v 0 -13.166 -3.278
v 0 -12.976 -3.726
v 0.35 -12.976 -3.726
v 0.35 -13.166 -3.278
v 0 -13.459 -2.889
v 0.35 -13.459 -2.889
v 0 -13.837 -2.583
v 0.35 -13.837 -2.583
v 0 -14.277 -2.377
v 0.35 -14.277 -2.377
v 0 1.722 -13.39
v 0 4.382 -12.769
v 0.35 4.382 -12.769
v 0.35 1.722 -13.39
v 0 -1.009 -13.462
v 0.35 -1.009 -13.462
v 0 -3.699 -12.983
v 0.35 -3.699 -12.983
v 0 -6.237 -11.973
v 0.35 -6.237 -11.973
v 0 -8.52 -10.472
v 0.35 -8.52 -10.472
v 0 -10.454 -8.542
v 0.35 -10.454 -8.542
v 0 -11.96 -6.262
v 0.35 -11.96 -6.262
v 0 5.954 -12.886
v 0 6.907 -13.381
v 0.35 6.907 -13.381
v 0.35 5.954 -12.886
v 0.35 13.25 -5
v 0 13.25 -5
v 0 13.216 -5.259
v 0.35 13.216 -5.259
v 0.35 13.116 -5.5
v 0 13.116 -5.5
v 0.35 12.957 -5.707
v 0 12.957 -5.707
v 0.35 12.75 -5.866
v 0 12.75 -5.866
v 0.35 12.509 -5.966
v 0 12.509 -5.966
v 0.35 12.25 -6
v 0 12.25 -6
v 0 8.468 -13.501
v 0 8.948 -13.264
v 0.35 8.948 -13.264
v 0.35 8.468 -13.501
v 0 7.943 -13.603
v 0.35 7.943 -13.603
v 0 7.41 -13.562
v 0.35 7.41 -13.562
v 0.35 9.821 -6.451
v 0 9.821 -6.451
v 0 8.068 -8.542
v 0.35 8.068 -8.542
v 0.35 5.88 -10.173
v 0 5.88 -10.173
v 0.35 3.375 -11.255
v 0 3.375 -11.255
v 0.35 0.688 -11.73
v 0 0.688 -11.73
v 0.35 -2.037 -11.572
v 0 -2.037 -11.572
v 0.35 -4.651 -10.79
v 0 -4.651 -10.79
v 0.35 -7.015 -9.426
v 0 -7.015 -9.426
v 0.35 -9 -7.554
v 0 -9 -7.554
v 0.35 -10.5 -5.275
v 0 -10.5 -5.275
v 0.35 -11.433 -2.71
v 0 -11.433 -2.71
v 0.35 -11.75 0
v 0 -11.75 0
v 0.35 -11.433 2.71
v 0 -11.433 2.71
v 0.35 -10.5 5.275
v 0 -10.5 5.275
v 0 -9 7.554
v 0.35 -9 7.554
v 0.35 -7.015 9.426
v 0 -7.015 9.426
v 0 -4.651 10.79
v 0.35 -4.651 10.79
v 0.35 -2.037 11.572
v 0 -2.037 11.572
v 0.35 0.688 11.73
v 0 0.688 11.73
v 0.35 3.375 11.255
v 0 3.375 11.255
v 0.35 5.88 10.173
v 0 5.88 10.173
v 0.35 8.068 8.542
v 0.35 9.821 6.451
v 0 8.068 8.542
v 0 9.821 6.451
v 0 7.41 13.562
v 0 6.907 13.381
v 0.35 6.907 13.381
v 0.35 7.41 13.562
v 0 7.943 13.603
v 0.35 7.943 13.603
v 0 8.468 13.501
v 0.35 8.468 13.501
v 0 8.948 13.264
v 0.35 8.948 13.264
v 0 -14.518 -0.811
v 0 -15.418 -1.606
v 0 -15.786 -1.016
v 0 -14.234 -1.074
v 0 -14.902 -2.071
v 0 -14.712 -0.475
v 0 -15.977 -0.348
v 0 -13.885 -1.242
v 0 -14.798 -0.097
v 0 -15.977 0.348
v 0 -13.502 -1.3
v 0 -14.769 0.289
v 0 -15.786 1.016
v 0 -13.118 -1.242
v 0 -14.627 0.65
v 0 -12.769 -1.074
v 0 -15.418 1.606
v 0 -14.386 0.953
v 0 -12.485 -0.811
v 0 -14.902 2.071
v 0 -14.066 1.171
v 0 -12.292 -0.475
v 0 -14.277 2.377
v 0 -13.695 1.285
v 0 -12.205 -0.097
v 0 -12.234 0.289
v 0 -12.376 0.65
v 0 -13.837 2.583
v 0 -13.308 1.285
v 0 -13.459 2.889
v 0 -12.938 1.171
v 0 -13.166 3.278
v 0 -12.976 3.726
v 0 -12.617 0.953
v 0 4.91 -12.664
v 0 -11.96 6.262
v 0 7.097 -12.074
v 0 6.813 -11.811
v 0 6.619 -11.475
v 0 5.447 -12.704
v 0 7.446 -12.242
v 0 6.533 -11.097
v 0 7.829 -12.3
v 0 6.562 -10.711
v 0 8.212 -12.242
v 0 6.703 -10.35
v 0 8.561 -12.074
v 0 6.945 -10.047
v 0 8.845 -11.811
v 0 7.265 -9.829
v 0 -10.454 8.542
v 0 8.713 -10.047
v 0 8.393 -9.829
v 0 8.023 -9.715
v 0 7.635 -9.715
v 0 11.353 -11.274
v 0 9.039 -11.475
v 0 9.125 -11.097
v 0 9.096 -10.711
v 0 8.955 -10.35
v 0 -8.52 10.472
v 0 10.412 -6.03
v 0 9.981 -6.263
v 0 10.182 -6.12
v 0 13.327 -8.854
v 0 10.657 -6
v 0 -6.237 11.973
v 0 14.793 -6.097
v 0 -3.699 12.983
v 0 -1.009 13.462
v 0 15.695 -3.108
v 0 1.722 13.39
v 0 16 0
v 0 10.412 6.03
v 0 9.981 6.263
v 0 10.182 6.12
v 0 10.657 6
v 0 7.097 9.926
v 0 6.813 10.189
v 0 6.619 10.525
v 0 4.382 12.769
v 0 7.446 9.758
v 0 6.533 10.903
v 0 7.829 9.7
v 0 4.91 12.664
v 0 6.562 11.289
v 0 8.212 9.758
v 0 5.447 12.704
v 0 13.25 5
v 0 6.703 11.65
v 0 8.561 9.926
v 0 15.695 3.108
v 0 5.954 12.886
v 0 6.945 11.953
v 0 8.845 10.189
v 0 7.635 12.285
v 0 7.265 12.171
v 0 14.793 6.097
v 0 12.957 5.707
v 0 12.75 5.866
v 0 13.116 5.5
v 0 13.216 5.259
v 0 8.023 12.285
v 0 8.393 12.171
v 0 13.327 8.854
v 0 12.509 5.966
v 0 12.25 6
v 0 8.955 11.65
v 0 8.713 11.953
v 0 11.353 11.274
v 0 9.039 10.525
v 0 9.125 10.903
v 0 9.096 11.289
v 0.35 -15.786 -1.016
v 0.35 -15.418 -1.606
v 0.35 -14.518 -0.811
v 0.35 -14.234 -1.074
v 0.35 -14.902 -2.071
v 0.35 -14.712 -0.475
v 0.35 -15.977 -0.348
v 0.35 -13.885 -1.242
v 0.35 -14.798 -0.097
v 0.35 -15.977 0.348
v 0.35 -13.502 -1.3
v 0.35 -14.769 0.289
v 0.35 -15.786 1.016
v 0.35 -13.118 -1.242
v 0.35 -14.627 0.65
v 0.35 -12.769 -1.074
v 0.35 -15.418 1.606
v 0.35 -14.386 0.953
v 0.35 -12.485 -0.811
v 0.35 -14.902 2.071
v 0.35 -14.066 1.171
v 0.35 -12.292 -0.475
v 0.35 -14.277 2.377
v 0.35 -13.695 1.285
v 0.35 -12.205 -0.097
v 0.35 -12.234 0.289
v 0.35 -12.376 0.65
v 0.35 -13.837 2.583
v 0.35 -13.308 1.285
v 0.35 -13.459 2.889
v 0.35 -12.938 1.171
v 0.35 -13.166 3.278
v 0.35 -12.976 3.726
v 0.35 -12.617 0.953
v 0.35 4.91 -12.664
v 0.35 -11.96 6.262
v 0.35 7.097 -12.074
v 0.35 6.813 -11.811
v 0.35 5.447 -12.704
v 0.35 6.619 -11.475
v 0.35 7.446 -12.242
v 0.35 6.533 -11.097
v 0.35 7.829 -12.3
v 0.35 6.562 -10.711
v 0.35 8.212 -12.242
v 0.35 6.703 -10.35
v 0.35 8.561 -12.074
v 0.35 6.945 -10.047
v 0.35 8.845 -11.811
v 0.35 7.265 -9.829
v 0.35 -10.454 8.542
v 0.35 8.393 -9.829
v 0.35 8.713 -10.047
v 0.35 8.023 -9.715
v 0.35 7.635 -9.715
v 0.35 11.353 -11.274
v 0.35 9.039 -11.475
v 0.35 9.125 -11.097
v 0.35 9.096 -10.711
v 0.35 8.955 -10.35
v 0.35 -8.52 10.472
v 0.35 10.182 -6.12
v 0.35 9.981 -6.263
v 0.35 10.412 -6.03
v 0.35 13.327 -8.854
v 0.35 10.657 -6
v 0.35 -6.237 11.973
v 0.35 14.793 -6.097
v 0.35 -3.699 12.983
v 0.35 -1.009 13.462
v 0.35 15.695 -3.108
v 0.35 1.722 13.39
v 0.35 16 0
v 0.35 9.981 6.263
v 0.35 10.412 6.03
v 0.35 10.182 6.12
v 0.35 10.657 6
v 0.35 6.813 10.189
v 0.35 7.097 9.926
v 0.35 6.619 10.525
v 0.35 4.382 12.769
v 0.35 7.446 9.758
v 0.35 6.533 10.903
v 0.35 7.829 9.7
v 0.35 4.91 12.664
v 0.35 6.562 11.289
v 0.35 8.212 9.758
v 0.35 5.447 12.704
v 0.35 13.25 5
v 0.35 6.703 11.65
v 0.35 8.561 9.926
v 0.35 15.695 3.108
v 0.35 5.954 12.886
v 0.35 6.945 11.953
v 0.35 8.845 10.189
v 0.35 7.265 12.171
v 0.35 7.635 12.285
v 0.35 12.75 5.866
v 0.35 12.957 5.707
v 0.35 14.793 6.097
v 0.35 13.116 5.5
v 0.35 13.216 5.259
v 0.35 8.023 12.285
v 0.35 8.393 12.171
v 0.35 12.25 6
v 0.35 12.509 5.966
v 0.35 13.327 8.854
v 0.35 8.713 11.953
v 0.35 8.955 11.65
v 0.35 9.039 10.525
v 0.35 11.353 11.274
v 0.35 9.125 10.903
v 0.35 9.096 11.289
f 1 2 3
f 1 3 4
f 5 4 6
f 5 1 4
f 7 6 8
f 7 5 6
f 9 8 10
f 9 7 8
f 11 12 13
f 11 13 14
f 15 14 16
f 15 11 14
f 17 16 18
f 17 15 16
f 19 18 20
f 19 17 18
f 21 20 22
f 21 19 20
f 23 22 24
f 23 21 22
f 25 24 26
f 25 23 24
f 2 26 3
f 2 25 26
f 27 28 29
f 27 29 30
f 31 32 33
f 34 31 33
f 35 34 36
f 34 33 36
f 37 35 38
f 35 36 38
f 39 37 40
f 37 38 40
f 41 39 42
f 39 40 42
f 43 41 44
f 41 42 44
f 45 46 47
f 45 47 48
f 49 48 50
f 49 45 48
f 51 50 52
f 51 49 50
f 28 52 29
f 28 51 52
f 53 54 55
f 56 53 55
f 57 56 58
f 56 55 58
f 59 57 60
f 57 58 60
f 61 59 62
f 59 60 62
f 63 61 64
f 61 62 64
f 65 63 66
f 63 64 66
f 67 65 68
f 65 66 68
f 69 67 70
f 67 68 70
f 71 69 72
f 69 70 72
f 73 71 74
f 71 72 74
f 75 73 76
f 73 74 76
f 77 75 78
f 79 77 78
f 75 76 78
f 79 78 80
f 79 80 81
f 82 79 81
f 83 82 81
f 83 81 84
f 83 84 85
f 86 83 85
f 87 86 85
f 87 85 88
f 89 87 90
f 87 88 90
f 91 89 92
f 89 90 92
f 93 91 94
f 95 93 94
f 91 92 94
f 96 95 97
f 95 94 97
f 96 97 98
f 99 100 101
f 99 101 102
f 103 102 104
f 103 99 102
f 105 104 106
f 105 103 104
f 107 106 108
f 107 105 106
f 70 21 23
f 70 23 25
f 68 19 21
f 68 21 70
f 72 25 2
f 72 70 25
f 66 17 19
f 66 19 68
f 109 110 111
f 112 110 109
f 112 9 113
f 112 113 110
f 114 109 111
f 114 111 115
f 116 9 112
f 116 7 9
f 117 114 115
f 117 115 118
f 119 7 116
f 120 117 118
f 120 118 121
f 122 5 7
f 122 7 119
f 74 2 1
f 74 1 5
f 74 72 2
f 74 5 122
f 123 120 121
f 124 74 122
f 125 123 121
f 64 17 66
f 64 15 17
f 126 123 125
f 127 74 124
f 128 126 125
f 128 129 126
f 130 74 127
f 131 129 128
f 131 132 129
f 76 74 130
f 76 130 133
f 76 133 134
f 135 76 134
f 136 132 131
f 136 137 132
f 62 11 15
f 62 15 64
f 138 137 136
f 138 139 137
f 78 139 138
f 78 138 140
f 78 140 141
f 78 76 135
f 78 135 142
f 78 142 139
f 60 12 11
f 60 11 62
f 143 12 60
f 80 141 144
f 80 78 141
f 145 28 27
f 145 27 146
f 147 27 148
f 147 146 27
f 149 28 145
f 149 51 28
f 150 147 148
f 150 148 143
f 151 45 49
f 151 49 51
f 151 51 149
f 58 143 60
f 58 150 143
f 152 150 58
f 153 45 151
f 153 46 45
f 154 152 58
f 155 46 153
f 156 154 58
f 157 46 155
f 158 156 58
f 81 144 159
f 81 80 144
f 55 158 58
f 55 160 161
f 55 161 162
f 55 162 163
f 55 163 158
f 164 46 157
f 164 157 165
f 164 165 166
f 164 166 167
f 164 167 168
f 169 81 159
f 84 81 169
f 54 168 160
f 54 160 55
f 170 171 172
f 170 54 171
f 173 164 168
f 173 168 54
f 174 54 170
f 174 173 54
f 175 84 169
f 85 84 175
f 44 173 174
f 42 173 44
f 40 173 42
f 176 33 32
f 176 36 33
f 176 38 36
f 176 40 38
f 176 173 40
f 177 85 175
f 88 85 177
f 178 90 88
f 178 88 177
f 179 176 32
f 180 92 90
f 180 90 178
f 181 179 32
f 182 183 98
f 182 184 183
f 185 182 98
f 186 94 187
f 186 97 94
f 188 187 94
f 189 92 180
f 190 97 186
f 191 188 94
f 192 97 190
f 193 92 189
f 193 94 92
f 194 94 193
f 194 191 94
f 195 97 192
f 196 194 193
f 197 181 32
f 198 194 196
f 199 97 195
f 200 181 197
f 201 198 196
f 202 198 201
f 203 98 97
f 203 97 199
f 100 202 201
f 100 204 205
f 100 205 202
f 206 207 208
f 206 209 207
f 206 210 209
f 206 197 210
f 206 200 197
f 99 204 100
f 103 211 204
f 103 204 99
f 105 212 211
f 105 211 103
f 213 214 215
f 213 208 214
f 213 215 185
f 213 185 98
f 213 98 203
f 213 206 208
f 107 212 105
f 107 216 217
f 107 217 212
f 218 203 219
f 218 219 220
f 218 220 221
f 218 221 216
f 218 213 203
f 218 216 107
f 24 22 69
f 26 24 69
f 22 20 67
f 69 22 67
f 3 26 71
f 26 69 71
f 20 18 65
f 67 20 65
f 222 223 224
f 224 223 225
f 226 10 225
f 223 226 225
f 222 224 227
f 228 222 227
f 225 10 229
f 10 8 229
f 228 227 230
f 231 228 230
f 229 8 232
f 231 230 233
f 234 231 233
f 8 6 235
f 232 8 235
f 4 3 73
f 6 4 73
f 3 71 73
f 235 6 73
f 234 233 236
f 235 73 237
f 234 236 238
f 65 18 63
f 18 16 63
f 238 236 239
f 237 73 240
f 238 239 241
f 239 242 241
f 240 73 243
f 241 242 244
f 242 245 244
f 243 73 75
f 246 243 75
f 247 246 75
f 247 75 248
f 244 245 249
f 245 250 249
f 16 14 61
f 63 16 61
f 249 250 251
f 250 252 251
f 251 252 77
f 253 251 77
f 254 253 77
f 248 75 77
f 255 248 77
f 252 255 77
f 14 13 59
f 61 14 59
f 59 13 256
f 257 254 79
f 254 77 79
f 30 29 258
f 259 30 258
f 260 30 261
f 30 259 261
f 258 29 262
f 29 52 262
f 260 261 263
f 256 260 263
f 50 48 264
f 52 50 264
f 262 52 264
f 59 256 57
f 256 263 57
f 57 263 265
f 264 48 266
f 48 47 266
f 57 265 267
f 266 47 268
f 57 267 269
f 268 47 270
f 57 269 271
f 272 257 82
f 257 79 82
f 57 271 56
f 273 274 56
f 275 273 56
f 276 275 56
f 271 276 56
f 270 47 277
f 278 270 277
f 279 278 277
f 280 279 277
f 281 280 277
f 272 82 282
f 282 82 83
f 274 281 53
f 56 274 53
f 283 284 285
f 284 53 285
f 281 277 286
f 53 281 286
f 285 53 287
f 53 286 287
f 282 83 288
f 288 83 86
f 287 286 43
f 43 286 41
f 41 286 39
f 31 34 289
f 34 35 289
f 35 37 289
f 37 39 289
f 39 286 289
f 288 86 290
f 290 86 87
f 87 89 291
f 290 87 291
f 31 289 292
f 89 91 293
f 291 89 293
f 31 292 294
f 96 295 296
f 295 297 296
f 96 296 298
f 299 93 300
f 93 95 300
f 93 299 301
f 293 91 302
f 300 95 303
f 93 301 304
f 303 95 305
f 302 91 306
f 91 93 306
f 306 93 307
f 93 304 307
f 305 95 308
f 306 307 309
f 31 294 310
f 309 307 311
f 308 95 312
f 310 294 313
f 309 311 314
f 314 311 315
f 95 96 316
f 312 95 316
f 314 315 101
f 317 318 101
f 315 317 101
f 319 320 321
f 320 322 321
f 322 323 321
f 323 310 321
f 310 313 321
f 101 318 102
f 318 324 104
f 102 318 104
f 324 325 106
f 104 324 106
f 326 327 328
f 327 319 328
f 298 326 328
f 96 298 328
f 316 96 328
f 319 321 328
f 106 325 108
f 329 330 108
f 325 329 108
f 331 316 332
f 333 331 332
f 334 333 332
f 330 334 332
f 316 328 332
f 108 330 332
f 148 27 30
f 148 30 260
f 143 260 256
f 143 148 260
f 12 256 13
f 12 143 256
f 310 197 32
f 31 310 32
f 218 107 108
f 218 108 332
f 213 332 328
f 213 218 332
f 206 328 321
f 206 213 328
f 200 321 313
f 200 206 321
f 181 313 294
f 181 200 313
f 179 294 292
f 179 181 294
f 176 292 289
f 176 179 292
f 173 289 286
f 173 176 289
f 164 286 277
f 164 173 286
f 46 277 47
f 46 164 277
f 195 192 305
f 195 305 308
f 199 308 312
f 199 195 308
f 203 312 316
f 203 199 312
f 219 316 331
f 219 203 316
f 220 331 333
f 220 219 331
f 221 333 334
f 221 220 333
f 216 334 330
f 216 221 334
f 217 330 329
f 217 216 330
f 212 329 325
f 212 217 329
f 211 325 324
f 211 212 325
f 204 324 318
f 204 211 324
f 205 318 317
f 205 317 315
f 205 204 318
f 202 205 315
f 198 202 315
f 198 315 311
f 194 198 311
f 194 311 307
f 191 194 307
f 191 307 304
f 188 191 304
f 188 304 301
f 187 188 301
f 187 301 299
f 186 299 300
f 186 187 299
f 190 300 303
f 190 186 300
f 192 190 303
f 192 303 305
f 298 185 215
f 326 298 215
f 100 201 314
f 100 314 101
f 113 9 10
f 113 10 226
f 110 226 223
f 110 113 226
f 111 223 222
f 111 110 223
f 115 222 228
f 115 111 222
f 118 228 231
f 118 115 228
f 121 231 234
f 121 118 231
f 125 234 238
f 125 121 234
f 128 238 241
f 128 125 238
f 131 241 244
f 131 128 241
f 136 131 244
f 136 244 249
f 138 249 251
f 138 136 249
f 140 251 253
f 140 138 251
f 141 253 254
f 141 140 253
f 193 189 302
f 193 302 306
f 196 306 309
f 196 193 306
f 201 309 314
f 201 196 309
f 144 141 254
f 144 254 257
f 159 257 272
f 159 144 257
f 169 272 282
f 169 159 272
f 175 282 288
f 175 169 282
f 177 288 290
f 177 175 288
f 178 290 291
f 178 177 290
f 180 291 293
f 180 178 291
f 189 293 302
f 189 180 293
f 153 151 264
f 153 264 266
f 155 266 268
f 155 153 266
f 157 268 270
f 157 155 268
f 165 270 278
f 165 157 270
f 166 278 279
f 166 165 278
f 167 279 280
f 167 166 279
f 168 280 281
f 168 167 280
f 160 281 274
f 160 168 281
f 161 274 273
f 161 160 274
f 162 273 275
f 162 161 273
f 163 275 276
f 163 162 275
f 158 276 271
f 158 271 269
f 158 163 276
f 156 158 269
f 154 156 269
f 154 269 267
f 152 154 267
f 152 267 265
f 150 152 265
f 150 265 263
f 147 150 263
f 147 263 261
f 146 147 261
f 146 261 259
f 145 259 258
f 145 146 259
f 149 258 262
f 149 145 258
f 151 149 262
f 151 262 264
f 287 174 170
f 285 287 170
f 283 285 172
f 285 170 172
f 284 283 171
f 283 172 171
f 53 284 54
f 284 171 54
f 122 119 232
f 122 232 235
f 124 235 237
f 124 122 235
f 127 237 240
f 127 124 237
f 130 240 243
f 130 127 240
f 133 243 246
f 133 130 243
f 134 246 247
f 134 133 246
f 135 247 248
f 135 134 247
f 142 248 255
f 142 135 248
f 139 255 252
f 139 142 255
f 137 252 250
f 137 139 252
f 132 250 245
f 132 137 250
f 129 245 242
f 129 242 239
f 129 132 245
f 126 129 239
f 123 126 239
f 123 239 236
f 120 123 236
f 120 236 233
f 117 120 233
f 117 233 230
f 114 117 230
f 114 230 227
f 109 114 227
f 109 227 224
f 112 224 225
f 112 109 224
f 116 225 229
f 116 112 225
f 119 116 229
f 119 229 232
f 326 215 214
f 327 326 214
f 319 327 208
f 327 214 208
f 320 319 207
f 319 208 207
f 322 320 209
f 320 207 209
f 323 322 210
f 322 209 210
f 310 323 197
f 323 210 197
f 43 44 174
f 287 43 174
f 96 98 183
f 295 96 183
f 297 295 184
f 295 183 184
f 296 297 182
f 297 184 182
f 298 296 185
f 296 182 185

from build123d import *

# Parameters (mm, degrees)
SKETCH1_R      = 1.3
EXTRUDE1_DEPTH = 0.35


with BuildPart() as part:
    # Sketch1 → Extrude1 (new body)
    with BuildSketch(Plane(origin=(0, 0, 0), x_dir=(0, 0, -1), z_dir=(1, 0, 0))):
        with BuildLine():
            Line((-12.885760186, 5.95357069), (-13.381095839, 6.907130708))
            ThreePointArc((-13.381095839, 6.907130708), (-13.603001468, 7.943369547), (-13.264308138, 8.947520865))
            ThreePointArc((-13.264308138, 8.947520865), (0, 16), (13.264308138, 8.947520865))
            ThreePointArc((13.264308138, 8.947520865), (13.603001468, 7.943369547), (13.381095839, 6.907130708))
            Line((13.381095839, 6.907130708), (12.885760186, 5.95357069))
            ThreePointArc((12.885760186, 5.95357069), (12.66609567, 5.17996722), (12.768897836, 4.382379268))
            ThreePointArc((12.768897836, 4.382379268), (11.972673932, -6.2373936), (3.725896212, -12.97565788))
            ThreePointArc((3.725896212, -12.97565788), (2.889265769, -13.458620697), (2.376600464, -14.277386759))
            ThreePointArc((2.376600464, -14.277386759), (0, -16.001648251), (-2.376600464, -14.277386759))
            ThreePointArc((-2.376600464, -14.277386759), (-2.889265769, -13.458620697), (-3.725896212, -12.97565788))
            ThreePointArc((-3.725896212, -12.97565788), (-11.972673932, -6.2373936), (-12.768897836, 4.382379268))
            ThreePointArc((-12.768897836, 4.382379268), (-12.66609567, 5.17996722), (-12.885760186, 5.95357069))
        make_face()
        with Locations((11, 7.829080757)):
            Circle(SKETCH1_R, mode=Mode.SUBTRACT)
        with Locations((-11, 7.829080757)):
            Circle(SKETCH1_R, mode=Mode.SUBTRACT)
        with Locations((0, -13.501648251)):
            Circle(SKETCH1_R, mode=Mode.SUBTRACT)
        with BuildLine():
            Line((-5, 13.25), (5, 13.25))
            ThreePointArc((5, 13.25), (5.707106781, 12.957106781), (6, 12.25))
            Line((6, 12.25), (6, 10.656570743))
            ThreePointArc((6, 10.656570743), (6.119937614, 10.181712663), (6.450980392, 9.820761273))
            ThreePointArc((6.450980392, 9.820761273), (0, -11.75), (-6.450980392, 9.820761273))
            ThreePointArc((-6.450980392, 9.820761273), (-6.119937614, 10.181712663), (-6, 10.656570743))
            Line((-6, 10.656570743), (-6, 12.25))
            ThreePointArc((-6, 12.25), (-5.707106781, 12.957106781), (-5, 13.25))
        make_face(mode=Mode.SUBTRACT)
    extrude(amount=EXTRUDE1_DEPTH)


solid = part.part
